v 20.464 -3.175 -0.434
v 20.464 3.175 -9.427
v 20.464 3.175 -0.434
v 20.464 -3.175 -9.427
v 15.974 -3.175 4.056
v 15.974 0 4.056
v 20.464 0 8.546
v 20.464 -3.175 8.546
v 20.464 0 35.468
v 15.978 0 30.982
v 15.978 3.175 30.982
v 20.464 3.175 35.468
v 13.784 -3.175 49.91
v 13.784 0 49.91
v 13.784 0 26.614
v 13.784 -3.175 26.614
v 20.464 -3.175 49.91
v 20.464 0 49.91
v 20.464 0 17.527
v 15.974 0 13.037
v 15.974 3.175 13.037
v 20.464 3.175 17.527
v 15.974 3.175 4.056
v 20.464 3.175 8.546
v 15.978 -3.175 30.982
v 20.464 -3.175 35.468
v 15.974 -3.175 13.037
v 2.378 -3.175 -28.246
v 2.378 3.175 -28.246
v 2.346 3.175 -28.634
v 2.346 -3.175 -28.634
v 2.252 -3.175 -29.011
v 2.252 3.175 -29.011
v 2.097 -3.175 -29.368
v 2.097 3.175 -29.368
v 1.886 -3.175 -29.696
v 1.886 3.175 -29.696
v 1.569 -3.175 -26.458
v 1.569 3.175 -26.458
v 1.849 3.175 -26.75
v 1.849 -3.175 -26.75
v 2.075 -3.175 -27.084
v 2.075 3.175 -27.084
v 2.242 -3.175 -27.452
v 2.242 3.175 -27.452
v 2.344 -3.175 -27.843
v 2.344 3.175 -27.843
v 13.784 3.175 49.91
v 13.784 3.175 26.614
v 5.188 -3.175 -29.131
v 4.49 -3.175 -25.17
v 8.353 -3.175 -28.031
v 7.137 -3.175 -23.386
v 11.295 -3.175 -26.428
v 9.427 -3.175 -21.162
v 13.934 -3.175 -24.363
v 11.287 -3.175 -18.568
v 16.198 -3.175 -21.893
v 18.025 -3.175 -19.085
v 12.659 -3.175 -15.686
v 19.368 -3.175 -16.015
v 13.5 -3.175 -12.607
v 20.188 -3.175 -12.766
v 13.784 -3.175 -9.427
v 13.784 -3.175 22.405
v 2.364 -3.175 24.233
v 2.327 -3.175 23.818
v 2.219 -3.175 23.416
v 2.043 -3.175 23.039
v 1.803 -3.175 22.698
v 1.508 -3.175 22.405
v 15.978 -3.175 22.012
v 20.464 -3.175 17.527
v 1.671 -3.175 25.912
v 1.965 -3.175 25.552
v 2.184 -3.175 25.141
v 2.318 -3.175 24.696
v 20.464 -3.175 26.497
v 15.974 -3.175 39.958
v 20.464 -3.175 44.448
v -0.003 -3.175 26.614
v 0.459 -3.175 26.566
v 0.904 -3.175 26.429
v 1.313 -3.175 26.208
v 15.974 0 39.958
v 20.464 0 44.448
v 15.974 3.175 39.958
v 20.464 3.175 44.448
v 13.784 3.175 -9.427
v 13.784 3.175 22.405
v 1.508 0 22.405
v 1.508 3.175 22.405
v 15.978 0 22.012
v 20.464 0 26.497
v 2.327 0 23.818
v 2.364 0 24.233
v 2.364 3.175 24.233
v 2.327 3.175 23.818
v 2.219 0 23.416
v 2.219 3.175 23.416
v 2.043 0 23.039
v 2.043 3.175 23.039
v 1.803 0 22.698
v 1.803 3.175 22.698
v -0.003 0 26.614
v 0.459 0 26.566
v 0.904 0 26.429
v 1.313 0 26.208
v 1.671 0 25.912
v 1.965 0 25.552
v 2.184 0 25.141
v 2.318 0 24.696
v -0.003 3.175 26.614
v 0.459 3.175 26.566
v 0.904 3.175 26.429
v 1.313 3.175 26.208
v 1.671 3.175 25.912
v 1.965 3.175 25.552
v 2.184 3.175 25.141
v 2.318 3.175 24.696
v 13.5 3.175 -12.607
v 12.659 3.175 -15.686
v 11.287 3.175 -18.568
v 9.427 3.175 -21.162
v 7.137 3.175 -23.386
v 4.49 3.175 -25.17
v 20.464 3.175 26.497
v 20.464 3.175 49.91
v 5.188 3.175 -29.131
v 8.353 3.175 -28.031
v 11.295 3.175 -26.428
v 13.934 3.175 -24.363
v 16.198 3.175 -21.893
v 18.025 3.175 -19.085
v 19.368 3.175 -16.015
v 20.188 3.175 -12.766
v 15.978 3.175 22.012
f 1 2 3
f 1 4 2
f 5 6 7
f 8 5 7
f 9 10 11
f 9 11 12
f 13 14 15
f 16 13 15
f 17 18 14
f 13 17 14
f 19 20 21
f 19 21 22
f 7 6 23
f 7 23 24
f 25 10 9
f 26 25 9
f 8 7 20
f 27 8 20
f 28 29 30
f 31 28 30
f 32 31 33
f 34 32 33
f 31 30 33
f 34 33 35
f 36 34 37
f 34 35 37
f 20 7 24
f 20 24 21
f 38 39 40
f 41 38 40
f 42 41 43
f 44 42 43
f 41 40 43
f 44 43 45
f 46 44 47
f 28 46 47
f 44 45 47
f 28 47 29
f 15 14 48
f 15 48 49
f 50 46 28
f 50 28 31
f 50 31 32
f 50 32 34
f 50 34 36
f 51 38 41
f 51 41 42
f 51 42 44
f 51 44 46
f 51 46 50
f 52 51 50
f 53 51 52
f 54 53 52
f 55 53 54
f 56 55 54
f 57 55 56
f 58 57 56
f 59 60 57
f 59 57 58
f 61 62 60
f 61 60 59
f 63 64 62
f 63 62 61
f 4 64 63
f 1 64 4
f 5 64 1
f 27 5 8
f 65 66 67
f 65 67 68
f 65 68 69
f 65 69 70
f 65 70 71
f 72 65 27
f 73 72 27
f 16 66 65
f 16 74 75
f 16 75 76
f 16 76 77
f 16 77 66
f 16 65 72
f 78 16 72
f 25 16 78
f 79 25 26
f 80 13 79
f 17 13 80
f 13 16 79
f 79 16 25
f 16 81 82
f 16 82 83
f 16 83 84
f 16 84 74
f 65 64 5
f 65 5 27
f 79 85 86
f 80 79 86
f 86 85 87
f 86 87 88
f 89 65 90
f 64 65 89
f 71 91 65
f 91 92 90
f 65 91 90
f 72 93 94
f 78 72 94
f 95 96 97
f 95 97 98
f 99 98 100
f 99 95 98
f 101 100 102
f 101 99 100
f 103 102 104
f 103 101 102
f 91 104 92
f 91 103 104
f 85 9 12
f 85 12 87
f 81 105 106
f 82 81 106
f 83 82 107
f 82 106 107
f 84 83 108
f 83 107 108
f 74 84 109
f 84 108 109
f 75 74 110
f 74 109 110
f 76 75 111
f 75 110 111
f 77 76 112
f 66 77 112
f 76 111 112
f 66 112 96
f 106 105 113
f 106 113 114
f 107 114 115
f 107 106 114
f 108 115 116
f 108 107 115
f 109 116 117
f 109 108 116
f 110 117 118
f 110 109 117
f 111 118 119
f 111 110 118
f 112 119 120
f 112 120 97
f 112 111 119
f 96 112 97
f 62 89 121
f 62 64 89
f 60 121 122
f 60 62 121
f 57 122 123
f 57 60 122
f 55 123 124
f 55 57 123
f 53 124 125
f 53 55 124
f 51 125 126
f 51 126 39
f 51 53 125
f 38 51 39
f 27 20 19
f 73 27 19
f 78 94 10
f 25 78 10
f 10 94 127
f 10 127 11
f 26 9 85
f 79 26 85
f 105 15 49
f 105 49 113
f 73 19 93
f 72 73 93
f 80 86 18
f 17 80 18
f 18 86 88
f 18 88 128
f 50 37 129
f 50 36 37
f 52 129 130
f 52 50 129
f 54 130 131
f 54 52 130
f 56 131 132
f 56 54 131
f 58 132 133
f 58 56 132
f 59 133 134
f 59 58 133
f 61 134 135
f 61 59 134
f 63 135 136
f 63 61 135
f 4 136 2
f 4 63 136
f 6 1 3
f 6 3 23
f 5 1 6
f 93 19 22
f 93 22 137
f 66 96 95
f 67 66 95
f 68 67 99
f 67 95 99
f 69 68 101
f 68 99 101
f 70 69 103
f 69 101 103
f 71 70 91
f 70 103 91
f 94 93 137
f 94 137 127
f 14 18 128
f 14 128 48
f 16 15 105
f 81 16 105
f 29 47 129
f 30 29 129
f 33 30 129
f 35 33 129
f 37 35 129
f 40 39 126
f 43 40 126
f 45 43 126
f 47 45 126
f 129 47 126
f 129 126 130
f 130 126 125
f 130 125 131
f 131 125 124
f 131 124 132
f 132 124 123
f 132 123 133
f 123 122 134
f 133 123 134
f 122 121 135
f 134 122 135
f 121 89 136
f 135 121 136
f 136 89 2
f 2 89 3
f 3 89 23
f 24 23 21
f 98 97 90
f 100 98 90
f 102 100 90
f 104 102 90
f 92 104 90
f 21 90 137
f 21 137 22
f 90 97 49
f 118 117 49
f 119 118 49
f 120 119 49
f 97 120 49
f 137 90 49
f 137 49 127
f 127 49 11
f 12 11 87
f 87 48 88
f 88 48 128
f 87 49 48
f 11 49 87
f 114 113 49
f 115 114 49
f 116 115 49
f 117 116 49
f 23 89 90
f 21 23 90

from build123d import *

# Parameters (mm, degrees)
F1_DEPTH = 3.175


# Not quite as in the source:
# - a feature names something its author has since deleted; it is built from what else it names


with BuildPart() as f1:
    # F0 (on Front) → F1 (new body, symmetric)
    with BuildSketch(Plane.XZ):
        Polygon((13.7837369962, 22.4047590313), (13.7837369962, -9.4272618645), (20.4636742089, -9.4272618645), (20.4636742089, -0.4338561879), (15.9735461484, 4.0562718726), (20.4636742089, 8.5463999331), (15.9735461484, 13.0365279937), (20.4636742089, 17.5266560542), (15.978414683, 22.0119155801), (20.4636742089, 26.497175106), (15.978414683, 30.9824346319), (20.4636742089, 35.4676941578), (15.9735461484, 39.9578222184), (20.4636742089, 44.4479502789), (20.4636742089, 49.9097465079), (13.7837369962, 49.9097465079), (13.7837369962, 26.6143454669), align=None)
        with BuildLine():
            ThreePointArc((1.5690815371, -26.4578800095), (2.166296426, -27.2647981392), (2.3779042983, -28.246126117))
            ThreePointArc((2.3779042983, -28.246126117), (2.2515693271, -29.011442898), (1.8859695789, -29.69555336))
            ThreePointArc((1.8859695789, -29.69555336), (15.116594907, -23.1743956519), (20.4636742089, -9.4272618645))
            Line((20.4636742089, -9.4272618645), (13.7837369962, -9.4272618645))
            ThreePointArc((13.7837369962, -9.4272618645), (10.4143723985, -19.9062857024), (1.5690815371, -26.4578800095))
        make_face()
        with BuildLine():
            Line((1.5079542983, 22.4047590313), (13.7837369962, 22.4047590313))
            Line((13.7837369962, 22.4047590313), (13.7837369962, 26.6143454669))
            Line((13.7837369962, 26.6143454669), (-0.0033457017, 26.6143454669))
            ThreePointArc((-0.0033457017, 26.6143454669), (1.6712163547, 25.9118815011), (2.363628681, 24.2331382585))
            ThreePointArc((2.363628681, 24.2331382585), (2.1391272177, 23.2237883133), (1.5079542983, 22.4047590313))
        make_face()
    extrude(amount=F1_DEPTH, both=True)


solid = f1.part
